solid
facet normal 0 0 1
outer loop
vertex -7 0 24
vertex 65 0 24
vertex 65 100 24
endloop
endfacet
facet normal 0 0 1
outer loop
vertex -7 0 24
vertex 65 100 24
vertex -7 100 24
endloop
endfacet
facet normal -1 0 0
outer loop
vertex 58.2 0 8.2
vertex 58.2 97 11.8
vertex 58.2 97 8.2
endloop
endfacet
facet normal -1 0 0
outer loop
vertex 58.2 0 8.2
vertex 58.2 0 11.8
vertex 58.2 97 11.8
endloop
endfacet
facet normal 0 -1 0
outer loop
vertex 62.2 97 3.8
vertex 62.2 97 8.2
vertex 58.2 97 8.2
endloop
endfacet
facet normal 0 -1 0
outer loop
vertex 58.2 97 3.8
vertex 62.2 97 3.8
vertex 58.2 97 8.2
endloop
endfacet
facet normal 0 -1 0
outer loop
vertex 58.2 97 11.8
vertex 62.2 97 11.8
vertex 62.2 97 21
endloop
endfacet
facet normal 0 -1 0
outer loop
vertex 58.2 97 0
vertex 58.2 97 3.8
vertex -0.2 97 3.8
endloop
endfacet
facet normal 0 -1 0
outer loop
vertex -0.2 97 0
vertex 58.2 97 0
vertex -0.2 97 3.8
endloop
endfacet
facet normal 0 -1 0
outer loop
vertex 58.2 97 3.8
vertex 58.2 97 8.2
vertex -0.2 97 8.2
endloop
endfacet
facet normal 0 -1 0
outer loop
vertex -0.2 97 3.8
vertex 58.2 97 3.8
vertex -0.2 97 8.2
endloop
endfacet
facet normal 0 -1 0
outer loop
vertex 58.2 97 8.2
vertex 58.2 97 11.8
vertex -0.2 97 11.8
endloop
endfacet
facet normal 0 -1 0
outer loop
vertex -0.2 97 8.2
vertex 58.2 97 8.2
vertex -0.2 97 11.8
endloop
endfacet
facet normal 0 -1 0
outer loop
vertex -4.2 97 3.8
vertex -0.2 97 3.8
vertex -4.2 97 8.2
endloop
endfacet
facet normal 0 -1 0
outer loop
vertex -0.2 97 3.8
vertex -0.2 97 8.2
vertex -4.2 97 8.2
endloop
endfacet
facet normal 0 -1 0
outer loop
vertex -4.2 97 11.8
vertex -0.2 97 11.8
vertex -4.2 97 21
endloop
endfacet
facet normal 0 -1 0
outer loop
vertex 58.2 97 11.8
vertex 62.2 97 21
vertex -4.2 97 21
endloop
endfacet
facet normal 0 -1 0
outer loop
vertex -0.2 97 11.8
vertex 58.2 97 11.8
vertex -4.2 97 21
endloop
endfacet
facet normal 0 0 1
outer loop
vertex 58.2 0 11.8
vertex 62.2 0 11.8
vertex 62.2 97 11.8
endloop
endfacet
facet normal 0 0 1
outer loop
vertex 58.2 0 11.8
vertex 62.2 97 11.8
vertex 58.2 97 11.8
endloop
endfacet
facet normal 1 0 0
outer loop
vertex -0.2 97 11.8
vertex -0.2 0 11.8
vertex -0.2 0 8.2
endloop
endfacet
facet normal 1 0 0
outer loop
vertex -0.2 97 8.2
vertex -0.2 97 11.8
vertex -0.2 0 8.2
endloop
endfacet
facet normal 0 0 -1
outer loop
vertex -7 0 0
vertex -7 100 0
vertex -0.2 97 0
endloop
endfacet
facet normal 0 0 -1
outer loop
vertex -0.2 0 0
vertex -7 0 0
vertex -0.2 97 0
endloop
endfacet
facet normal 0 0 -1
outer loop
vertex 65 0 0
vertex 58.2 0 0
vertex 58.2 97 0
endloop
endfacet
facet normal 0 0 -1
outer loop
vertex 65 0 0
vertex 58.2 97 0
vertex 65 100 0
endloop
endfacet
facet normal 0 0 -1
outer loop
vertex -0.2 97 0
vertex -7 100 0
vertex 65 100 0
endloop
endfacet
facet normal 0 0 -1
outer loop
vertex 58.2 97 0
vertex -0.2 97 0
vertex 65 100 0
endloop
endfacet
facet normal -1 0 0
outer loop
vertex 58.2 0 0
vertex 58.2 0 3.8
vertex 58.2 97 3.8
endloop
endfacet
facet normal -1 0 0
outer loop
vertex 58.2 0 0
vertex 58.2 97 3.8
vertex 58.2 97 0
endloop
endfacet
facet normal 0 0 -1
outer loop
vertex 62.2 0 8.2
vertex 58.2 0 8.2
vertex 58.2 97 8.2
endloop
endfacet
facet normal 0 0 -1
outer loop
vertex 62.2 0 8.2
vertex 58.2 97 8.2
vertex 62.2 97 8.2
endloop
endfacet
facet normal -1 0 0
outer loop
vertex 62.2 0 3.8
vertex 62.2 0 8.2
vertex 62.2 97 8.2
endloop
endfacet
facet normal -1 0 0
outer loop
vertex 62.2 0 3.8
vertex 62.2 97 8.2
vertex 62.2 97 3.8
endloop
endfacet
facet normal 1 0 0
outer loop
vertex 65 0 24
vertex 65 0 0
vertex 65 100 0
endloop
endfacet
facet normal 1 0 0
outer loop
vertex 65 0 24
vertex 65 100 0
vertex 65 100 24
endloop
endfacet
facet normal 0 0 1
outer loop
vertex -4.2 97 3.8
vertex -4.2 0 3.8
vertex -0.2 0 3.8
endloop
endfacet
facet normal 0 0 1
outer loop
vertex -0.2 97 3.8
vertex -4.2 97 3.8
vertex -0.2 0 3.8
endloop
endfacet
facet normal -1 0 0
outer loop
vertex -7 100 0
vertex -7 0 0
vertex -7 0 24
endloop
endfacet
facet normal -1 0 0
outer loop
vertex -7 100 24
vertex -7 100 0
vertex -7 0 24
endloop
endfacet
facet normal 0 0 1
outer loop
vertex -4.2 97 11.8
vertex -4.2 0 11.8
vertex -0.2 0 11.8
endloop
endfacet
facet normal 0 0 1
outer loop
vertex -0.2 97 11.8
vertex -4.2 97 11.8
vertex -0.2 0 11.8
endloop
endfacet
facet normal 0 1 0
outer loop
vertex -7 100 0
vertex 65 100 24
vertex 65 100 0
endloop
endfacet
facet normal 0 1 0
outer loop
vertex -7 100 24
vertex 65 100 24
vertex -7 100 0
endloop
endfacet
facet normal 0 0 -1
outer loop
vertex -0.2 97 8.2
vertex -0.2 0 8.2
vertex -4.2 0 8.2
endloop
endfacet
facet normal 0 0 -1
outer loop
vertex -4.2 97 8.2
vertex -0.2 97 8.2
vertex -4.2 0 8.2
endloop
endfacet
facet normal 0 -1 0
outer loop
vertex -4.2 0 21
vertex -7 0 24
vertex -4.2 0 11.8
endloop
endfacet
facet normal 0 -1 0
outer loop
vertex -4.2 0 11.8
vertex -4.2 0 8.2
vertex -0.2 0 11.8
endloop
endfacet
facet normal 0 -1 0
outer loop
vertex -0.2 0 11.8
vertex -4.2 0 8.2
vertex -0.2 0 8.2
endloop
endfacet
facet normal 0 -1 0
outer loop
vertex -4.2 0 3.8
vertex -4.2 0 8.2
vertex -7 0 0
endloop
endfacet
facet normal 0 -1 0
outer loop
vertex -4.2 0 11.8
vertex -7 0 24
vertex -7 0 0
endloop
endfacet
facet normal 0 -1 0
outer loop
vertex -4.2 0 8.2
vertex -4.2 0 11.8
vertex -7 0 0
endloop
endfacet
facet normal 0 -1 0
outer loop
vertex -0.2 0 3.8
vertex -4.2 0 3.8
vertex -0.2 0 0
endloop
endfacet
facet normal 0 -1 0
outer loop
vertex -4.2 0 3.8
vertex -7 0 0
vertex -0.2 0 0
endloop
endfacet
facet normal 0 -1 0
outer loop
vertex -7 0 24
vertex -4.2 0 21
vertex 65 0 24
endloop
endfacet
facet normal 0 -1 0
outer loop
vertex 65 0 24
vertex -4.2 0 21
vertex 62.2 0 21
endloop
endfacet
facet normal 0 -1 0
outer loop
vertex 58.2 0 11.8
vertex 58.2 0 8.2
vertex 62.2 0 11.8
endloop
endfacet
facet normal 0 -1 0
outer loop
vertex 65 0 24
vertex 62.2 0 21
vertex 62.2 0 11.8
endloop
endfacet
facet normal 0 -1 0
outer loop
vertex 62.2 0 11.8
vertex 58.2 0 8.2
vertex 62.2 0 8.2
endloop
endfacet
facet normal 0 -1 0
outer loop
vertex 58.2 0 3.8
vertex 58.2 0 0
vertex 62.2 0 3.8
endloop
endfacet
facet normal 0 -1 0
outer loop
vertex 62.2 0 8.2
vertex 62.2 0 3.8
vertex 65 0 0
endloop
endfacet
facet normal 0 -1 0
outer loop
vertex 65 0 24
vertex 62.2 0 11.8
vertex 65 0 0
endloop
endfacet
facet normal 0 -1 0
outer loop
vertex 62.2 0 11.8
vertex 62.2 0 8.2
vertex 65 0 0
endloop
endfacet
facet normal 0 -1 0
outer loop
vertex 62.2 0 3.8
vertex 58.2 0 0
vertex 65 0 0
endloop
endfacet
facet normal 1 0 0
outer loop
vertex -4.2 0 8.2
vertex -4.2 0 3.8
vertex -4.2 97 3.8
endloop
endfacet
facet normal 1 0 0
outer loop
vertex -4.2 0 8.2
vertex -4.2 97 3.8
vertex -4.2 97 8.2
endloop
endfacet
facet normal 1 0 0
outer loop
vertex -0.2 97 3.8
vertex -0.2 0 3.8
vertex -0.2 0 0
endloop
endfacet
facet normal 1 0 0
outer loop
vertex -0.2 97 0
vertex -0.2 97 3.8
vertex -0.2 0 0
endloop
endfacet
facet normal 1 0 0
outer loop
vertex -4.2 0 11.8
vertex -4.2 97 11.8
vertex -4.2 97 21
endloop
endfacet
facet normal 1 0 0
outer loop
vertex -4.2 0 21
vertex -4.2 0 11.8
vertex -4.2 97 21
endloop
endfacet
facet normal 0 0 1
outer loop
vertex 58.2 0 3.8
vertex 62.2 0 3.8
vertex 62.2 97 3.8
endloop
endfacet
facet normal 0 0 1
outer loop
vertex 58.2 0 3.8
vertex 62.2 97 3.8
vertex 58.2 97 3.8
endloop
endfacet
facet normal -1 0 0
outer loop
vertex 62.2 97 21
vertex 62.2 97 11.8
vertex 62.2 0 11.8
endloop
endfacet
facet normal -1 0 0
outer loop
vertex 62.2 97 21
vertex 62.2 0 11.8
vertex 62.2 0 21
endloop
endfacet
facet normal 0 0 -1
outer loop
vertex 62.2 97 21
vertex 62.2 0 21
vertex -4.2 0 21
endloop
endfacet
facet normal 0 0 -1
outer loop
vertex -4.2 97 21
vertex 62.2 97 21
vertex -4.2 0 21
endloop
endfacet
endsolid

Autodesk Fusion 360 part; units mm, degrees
sketch "Boceto1" plane through (0, 0, 0) normal (0, 1, 0) x (1, 0, 0)
  line L0 (58, 0) -> (62, 0)
  line L1 (62, 0) -> (62, -4)
  line L2 (62, -4) -> (58, -4)
  line L3 (58, -4) -> (58, 0)
  line L4 (58, -8) -> (62, -8)
  line L5 (62, -8) -> (62, -12)
  line L6 (62, -12) -> (58, -12)
  line L7 (58, -12) -> (58, -8)
  line L8 (62, -12) -> (62, -21)
  line L9 (62, -21) -> (-4, -21)
  line L10 (62, 0) -> (65, 0)
  line L11 (65, 0) -> (65, -24)
  line L12 (65, -24) -> (-7, -24)
  line L13 (29, -21) -> (29, -3)
  line L14 (-4, -12) -> (0, -12)
  line L15 (0, -8) -> (-4, -8)
  line L16 (-4, -8) -> (-4, -12)
  line L17 (-4, -12) -> (-4, -21)
  line L18 (-4, -4) -> (0, -4)
  line L19 (-4, 0) -> (-4, -4)
  line L20 (-4, 0) -> (-7, 0)
  line L21 (-7, 0) -> (-7, -24)
  line L22 (-7, -24) -> (65, -24)
  line L23 (-4, -21) -> (62, -21)
  line L24 (0, 0) -> (-4, 0)
  line L25 (-4, -4) -> (-4, -8)
  line L26 (62, -8) -> (62, -4)
  line L27 (0, -16) -> (0, -8)
  line L28 (0, -4) -> (0, 0)
  line L29 (58, 0) -> (58, -4)
  line L30 (58, -8) -> (58, -16)
  dimension "d1" = 58
  dimension "d2" = 16
  dimension "d3" = 4
  dimension "d4" = 4
  dimension "d5" = 4
  dimension "d6" = 4
  dimension "d7" = 4
  dimension "d8" = 9
  dimension "d9" = 66
  dimension "d10" = 24
  dimension "d11" = 72
extrude "Extruir1" add sketch "Boceto1" along normal blind 100
sketch "Boceto2" plane through (0, 100, 0) normal (0, 1, 0) x (-1, 0, 0)
  line L0 (-62, 8) -> (-58, 8)
  line L1 (-58, 8) -> (-58, 12)
  line L2 (-58, 12) -> (-62, 12)
  line L3 (-62, 12) -> (-62, 21)
  line L4 (-62, 21) -> (4, 21)
  line L5 (4, 21) -> (4, 12)
  line L6 (4, 12) -> (0, 12)
  line L7 (0, 12) -> (0, 8)
  line L8 (0, 8) -> (4, 8)
  line L9 (4, 8) -> (4, 4)
  line L10 (4, 4) -> (0, 4)
  line L11 (0, 4) -> (0, 0)
  line L12 (0, 0) -> (7, 0)
  line L13 (7, 0) -> (7, 24)
  line L14 (7, 24) -> (-65, 24)
  line L15 (-65, 24) -> (-65, 0)
  line L16 (-65, 0) -> (-58, 0)
  line L17 (-58, 0) -> (-58, 4)
  line L18 (-58, 4) -> (-62, 4)
  line L19 (-62, 4) -> (-62, 8)
  line L20 (7, 0) -> (-65, 0)
  line L21 (-65, 0) -> (-65, 24)
  line L22 (-65, 24) -> (7, 24)
  line L23 (7, 24) -> (7, 0)
extrude "Extruir2" add sketch "Boceto2" against normal blind 3 contours L0 L1 L2 L3 L4 L5 L6 L7 L8 L9 L10 L11 L17 L18 L19 L20
move_face "CarasDesfase1" offset -0.2 14 faces at (58, 32.3333, 2.6667) (58, 32.3333, 10.6667) (62, 32.3333, 15) (59.3333, 32.3333, 8) (62, 32.3333, 6.6667) (0, 32.3333, 2.6667) (-4, 32.3333, 5.3333) (0, 32.3333, 10.6667) (-4, 32.3333, 15) (-1.3333, 32.3333, 8) (-2.6667, 32.3333, 4) (-2.6667, 32.3333, 12) (59.3333, 64.6667, 4) (59.3333, 64.6667, 12)
